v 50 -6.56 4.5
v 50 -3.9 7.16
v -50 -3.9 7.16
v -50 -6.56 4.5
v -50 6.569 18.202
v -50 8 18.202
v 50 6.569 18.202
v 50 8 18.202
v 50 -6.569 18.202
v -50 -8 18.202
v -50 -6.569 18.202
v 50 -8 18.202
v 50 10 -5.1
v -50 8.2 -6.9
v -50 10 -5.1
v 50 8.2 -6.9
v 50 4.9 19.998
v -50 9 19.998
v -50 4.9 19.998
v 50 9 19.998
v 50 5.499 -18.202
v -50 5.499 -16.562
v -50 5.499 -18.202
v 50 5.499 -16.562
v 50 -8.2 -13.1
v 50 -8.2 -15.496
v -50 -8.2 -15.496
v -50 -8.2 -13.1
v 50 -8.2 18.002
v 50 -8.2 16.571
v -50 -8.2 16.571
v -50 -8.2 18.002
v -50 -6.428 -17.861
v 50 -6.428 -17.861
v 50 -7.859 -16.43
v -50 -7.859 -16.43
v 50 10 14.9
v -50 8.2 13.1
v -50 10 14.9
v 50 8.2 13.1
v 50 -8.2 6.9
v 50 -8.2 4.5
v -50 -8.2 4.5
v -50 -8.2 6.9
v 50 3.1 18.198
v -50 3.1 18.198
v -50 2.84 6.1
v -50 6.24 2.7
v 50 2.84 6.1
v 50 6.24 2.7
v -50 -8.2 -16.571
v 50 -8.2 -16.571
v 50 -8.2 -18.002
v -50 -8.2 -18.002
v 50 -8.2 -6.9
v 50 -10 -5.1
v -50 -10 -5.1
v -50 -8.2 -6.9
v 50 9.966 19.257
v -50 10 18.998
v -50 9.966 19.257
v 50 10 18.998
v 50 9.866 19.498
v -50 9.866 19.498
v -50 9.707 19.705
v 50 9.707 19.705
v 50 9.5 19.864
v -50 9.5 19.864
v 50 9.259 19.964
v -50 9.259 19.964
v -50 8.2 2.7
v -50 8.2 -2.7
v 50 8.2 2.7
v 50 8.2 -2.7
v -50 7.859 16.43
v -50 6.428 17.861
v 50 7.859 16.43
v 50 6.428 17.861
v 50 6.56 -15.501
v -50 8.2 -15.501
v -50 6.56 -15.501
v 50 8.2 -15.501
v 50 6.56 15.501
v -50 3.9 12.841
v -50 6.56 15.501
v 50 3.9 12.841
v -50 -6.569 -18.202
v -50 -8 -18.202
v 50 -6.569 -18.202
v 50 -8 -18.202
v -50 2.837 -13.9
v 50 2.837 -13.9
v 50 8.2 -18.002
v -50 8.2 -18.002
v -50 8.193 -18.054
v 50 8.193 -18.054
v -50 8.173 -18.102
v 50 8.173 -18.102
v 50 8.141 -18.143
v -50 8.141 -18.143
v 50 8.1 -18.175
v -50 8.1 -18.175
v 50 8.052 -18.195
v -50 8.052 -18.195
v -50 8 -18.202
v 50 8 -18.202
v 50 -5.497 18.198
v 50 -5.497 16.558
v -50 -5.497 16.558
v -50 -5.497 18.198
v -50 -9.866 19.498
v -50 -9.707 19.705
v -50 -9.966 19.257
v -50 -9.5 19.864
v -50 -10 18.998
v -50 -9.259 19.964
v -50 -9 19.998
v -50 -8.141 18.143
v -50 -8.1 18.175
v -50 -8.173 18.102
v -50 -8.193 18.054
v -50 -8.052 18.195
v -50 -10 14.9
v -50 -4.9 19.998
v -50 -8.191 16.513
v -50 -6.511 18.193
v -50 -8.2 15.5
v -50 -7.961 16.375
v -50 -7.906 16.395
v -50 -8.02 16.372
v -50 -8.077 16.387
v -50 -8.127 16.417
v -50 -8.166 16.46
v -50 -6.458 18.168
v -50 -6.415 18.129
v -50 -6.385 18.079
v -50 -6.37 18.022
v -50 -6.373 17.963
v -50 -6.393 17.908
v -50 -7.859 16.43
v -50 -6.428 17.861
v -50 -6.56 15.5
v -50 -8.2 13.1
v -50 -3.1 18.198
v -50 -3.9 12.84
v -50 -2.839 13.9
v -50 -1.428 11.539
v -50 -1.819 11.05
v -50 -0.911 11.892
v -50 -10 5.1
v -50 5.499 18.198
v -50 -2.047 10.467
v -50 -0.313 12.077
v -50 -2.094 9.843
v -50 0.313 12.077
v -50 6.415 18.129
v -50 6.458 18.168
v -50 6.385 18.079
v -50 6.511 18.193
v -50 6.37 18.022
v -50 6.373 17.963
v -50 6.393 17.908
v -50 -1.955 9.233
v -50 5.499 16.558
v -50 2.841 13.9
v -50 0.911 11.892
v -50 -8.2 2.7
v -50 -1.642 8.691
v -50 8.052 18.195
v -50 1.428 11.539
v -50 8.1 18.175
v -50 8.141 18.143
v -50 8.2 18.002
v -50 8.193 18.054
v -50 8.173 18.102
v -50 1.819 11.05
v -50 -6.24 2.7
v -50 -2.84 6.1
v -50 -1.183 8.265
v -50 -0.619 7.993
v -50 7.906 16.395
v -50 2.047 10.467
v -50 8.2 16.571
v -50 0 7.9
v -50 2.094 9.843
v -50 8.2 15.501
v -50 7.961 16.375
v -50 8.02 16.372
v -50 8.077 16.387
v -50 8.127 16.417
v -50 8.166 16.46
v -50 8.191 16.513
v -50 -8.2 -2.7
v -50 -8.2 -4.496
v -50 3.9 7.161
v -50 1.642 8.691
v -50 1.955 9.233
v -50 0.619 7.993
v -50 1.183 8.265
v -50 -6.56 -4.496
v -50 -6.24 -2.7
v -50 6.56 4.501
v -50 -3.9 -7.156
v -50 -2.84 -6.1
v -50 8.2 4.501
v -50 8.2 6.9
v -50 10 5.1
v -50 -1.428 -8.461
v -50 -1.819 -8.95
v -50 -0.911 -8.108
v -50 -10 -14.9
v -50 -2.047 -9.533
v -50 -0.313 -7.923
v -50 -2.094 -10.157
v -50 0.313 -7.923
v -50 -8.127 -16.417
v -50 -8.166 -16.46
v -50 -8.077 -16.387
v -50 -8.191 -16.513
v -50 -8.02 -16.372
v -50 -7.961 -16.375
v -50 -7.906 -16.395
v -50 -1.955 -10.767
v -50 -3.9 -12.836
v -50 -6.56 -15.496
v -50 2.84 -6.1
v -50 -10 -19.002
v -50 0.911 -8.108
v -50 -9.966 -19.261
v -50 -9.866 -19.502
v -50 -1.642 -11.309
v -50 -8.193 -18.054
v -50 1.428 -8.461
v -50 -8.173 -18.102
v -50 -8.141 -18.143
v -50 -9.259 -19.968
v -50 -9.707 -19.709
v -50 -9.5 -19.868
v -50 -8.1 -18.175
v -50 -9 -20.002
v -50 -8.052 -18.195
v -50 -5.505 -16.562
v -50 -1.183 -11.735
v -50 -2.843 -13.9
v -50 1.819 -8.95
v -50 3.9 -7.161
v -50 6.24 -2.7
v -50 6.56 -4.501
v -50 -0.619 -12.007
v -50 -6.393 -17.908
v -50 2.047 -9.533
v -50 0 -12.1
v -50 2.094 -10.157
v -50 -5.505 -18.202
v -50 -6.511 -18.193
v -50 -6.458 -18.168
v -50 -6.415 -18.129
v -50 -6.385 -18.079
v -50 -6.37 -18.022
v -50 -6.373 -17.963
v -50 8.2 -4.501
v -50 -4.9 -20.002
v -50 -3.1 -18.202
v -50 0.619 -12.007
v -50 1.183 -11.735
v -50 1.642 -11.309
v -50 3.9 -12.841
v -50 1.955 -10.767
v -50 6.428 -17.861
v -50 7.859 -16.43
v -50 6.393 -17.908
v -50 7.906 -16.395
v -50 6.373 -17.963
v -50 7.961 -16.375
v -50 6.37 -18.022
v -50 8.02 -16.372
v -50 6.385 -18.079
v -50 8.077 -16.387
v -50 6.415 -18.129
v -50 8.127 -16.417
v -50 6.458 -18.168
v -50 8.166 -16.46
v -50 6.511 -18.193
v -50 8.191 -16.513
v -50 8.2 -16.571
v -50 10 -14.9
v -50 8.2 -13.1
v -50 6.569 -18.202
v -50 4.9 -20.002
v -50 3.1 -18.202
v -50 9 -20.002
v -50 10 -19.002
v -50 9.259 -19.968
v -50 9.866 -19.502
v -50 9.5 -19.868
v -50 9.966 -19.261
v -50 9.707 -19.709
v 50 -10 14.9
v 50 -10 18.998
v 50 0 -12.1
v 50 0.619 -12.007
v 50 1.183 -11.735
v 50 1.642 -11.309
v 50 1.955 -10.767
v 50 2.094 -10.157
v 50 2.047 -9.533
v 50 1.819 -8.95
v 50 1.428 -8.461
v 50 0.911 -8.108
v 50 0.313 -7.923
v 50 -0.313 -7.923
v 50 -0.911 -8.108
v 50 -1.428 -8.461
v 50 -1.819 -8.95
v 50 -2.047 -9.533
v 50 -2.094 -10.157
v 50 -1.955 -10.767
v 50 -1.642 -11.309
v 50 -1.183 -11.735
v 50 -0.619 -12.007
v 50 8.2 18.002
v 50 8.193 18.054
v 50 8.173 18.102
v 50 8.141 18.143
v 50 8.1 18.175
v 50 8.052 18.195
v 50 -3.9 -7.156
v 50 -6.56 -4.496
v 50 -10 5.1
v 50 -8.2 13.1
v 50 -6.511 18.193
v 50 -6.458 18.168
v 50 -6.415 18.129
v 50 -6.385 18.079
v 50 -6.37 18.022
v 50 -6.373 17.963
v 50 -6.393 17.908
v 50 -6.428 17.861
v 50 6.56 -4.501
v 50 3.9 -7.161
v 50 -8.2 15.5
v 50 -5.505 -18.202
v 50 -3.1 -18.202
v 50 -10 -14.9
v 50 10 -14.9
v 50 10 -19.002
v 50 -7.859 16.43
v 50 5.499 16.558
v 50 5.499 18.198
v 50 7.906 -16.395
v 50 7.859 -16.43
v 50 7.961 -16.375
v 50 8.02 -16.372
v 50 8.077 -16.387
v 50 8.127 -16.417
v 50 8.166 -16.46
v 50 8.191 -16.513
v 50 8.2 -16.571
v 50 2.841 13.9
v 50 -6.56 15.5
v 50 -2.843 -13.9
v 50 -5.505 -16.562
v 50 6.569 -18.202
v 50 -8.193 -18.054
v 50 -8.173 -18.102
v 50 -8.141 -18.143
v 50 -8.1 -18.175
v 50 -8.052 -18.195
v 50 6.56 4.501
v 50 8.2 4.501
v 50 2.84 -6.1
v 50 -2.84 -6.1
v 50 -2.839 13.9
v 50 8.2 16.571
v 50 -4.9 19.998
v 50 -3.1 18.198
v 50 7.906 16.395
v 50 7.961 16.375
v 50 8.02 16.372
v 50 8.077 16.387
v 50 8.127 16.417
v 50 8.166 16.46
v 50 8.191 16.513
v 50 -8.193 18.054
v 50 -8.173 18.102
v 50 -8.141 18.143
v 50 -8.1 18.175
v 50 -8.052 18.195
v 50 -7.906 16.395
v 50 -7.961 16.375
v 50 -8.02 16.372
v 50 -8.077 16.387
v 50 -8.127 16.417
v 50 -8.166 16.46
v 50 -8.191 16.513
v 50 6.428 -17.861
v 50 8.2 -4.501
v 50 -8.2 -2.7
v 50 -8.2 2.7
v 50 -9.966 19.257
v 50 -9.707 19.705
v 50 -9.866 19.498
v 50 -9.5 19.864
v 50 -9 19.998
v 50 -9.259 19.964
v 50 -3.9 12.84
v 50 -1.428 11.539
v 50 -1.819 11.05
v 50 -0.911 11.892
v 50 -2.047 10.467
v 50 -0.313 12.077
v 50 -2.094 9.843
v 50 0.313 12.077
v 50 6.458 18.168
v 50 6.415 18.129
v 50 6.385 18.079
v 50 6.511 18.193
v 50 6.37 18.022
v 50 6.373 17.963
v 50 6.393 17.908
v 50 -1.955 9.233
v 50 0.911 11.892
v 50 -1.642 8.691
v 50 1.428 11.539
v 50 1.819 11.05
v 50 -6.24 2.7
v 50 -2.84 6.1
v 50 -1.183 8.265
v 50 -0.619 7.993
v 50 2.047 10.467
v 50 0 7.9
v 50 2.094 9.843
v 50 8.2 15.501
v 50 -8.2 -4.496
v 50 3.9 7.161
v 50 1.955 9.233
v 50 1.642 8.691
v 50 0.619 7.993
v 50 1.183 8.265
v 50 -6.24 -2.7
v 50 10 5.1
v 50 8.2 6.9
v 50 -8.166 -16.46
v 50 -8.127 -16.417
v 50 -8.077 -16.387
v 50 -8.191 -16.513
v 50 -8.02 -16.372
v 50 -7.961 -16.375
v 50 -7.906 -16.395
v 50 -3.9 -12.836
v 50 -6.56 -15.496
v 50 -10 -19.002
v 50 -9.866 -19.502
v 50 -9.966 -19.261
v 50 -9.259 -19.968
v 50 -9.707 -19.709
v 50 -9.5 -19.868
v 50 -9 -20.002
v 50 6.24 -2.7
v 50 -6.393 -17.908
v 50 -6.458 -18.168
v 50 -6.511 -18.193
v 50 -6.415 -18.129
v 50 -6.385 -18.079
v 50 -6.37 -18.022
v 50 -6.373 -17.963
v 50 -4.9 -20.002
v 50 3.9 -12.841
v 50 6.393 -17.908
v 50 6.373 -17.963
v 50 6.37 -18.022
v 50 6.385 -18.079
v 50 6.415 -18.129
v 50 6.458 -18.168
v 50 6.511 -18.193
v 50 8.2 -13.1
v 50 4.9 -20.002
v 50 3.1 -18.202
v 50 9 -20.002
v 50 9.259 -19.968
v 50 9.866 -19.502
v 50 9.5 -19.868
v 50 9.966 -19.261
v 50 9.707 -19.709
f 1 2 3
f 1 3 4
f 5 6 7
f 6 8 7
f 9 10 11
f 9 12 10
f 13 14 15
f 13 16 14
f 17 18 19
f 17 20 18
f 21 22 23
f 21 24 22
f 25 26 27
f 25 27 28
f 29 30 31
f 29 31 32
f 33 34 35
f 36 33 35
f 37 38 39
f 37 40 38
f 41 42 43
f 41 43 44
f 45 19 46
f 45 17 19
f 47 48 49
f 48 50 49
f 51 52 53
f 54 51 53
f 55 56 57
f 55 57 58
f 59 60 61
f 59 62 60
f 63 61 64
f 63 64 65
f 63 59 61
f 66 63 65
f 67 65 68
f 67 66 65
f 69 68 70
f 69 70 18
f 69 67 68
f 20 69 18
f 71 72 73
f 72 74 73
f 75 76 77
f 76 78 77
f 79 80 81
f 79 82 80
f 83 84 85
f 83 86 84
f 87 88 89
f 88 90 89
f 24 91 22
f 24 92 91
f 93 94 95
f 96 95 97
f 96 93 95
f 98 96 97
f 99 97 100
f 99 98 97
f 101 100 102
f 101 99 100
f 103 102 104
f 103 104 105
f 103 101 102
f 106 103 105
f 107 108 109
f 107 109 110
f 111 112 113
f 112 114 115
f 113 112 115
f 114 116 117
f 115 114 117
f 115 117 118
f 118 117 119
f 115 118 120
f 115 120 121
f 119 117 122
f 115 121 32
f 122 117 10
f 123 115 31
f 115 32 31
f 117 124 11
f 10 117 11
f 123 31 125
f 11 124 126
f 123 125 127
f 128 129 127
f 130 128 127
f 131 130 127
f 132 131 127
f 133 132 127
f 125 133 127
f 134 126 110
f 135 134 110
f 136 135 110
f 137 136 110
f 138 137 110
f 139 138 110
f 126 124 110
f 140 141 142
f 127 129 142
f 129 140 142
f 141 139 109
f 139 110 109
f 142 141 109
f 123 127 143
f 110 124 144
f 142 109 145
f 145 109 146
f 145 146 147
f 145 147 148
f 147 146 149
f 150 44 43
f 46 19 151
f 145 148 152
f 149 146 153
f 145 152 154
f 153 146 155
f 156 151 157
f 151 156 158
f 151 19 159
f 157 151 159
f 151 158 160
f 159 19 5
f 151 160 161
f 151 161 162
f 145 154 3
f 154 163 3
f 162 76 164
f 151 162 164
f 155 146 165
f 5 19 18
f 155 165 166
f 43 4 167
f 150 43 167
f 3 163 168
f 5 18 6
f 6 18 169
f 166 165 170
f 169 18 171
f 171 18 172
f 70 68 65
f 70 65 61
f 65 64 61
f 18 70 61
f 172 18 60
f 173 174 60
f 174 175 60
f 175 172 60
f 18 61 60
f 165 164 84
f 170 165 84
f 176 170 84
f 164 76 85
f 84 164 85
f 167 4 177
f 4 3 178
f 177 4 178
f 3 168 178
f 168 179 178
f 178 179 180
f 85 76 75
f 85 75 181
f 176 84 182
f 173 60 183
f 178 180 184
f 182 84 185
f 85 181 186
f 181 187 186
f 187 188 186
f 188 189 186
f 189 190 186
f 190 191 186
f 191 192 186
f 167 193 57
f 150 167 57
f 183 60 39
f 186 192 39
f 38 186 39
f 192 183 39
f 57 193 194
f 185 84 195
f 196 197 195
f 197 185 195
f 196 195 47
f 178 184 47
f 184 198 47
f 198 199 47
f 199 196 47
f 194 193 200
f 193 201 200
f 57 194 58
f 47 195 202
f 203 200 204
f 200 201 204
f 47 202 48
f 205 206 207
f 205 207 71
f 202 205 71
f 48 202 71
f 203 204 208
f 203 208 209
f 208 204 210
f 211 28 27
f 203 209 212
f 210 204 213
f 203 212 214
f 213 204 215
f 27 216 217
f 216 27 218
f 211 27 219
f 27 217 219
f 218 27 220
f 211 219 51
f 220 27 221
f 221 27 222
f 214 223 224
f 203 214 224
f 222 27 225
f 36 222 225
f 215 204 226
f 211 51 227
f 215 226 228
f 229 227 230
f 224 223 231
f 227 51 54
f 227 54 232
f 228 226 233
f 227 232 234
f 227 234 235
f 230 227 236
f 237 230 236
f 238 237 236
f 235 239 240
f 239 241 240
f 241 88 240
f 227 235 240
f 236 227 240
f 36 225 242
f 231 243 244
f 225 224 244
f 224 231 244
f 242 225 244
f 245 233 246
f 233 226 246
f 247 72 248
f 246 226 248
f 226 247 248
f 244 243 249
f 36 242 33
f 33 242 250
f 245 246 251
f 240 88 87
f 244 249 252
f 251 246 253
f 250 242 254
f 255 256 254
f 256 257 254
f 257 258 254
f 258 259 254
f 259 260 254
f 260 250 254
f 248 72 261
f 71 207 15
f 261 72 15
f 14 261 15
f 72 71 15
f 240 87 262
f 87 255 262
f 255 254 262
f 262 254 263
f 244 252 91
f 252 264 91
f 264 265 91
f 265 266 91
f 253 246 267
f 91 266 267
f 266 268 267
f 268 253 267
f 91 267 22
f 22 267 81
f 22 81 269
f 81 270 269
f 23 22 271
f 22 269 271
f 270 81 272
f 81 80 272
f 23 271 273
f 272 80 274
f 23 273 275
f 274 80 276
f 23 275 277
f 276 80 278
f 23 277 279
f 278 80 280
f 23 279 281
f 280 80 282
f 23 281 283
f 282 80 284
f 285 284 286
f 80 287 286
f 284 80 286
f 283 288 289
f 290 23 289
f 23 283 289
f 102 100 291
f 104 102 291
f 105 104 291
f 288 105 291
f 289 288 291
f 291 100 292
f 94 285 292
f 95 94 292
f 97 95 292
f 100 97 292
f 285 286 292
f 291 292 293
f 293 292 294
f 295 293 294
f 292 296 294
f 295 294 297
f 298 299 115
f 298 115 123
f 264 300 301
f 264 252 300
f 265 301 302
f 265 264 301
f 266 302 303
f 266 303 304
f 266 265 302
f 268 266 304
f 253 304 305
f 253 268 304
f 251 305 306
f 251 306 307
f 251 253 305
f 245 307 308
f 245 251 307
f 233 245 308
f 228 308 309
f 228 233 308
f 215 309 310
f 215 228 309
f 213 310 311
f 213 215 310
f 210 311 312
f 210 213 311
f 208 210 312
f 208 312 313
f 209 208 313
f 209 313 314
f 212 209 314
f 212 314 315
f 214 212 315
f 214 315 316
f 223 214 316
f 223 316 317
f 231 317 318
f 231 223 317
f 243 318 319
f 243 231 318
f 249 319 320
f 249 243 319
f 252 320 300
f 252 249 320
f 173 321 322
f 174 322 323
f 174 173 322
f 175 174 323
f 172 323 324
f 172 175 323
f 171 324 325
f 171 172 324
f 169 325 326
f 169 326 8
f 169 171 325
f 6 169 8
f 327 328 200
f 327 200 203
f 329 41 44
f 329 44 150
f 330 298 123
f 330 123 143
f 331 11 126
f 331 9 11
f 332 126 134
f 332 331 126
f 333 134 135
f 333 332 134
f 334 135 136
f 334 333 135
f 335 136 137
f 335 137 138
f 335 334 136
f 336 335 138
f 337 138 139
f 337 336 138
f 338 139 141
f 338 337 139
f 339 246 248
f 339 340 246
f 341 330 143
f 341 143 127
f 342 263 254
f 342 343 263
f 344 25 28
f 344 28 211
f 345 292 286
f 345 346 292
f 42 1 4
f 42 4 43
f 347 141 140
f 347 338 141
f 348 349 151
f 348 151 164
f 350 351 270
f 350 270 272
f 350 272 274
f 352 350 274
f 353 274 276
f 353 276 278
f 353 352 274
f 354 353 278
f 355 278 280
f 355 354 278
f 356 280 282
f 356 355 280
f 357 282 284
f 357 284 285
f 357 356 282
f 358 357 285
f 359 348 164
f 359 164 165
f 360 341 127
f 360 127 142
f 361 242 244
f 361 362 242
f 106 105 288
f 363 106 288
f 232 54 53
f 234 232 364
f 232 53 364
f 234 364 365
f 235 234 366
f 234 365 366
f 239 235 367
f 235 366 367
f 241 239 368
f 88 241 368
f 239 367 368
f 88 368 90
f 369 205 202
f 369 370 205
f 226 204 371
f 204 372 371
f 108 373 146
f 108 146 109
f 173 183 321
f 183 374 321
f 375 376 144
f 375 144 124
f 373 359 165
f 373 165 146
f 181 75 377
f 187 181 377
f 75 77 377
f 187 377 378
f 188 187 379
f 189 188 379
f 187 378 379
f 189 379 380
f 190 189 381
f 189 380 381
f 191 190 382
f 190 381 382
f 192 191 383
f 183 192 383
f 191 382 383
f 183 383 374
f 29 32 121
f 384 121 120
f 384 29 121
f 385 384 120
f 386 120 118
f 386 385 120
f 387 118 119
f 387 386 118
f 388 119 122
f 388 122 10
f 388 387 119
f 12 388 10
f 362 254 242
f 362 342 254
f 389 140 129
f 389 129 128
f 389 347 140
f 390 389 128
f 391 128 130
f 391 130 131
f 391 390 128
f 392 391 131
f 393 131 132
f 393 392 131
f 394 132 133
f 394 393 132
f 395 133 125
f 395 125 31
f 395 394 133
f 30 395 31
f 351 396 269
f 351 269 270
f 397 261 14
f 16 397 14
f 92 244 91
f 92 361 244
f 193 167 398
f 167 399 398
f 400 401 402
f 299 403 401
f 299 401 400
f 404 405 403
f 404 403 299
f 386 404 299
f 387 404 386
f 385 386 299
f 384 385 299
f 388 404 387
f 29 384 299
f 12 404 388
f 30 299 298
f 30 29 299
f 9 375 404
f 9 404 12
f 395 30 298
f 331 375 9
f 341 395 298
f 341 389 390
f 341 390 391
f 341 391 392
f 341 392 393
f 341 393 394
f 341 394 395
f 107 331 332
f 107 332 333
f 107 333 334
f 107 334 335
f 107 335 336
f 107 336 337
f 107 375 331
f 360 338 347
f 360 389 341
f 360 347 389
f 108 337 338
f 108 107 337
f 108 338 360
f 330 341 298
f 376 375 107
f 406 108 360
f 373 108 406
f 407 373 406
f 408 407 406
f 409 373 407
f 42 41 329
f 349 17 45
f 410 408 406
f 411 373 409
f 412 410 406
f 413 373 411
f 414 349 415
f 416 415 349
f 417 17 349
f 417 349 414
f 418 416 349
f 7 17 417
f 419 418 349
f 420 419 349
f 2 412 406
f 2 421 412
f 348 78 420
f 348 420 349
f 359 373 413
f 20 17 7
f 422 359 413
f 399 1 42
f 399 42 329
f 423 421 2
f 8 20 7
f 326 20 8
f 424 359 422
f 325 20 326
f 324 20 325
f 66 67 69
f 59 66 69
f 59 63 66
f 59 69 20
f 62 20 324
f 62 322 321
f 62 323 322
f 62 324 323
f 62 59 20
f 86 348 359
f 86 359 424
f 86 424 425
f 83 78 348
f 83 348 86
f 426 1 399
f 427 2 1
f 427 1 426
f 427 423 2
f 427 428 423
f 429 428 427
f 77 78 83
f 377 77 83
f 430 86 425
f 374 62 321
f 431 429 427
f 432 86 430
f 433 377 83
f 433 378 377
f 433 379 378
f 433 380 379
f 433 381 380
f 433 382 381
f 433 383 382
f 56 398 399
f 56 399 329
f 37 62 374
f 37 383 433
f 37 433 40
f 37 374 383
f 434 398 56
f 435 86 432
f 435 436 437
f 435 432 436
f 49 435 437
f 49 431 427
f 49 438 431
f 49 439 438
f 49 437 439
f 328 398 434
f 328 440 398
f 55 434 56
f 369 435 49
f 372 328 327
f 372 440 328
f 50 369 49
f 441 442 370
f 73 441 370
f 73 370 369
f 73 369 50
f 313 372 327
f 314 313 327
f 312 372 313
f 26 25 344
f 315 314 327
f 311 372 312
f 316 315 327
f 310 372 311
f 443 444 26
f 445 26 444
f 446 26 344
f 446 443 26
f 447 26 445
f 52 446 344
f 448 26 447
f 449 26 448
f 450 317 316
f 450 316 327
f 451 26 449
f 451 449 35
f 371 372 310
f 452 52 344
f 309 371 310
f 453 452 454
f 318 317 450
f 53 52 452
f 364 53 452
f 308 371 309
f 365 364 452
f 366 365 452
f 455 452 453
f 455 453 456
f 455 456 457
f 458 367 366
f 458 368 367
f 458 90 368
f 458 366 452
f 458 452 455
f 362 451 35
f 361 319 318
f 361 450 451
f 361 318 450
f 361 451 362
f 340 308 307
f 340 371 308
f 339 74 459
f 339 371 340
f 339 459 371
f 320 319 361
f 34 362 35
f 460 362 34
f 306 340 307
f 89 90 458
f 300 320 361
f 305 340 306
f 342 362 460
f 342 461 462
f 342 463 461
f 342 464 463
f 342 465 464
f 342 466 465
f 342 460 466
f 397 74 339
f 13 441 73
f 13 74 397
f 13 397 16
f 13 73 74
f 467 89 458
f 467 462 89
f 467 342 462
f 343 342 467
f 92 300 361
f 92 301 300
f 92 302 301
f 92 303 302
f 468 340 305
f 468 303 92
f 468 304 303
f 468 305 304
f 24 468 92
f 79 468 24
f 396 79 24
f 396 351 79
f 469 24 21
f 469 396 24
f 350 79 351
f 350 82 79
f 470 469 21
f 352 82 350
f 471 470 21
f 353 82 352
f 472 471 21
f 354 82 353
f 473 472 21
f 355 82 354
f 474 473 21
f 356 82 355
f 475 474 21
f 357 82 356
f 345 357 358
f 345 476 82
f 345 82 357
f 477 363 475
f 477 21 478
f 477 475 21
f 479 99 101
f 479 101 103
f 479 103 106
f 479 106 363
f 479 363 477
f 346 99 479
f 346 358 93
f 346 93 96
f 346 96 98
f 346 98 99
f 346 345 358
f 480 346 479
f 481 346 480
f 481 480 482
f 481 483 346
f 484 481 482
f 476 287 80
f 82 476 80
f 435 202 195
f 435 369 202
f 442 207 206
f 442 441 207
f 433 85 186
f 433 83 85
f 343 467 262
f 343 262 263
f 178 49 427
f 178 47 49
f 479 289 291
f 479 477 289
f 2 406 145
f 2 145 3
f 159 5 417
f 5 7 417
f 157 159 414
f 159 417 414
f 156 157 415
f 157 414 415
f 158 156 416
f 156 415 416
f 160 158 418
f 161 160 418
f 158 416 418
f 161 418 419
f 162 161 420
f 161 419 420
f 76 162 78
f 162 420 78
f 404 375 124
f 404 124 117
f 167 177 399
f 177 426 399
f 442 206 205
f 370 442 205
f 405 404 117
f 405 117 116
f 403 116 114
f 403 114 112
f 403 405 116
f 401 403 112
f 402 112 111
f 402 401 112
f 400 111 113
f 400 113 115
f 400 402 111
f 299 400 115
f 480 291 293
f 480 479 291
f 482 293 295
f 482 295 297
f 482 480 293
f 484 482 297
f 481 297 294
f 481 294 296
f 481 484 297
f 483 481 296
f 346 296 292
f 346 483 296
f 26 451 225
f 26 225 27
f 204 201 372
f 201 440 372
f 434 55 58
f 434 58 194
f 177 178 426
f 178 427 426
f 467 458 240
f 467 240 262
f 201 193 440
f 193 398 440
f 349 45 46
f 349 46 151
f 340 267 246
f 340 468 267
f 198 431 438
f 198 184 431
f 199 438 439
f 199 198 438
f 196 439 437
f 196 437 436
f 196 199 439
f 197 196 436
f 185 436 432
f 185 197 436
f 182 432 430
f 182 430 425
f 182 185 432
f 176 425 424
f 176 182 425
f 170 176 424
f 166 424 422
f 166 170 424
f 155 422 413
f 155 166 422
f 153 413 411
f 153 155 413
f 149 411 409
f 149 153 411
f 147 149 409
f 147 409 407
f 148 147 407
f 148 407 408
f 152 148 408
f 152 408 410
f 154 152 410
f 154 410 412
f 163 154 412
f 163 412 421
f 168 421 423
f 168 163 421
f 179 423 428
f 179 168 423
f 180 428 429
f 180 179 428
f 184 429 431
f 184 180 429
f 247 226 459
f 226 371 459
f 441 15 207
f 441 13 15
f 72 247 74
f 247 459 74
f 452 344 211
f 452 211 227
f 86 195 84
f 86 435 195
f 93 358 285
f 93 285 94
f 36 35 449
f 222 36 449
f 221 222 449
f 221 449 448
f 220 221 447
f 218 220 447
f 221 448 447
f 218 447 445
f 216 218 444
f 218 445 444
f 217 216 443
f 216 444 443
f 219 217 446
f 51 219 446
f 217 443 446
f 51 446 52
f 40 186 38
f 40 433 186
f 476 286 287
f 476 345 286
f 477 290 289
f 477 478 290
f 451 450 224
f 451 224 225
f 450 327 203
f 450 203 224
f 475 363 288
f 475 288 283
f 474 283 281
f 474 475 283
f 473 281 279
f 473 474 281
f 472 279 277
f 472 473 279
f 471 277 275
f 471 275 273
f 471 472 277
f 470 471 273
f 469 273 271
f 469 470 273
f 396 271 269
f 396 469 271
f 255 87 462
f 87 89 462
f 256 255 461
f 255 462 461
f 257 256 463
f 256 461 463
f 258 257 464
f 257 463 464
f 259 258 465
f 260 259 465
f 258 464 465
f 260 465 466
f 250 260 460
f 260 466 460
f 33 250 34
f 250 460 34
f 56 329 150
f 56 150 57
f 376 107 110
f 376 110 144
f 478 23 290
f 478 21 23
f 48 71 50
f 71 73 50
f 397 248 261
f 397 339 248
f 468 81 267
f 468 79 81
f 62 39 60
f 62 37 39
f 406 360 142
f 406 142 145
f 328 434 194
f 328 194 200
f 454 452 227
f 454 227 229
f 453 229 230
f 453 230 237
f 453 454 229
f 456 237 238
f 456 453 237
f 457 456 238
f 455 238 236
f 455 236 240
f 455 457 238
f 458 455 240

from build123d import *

# Parameters (mm, degrees)
SKETCH5_R           = 2.1
BOSS_EXTRUDE1_DEPTH = 50


with BuildPart() as part:
    # Sketch5 → Boss-Extrude1 (new, symmetric)
    with BuildSketch(Plane(origin=(0, 0, 0), x_dir=(0, 0, -1), z_dir=(1, 0, 0))):
        with BuildLine():
            Line((-19.998019485, 4.9), (-18.198019485, 3.1))
            Line((-18.198019485, 3.1), (-18.198019485, 5.499339828))
            Line((-18.198019485, 5.499339828), (-16.558019485, 5.499339828))
            Line((-16.558019485, 5.499339828), (-13.9, 2.841320344))
            Line((-13.9, 2.841320344), (-13.9, -2.838679656))
            Line((-13.9, -2.838679656), (-16.558019485, -5.496699141))
            Line((-16.558019485, -5.496699141), (-18.198019485, -5.496699141))
            Line((-18.198019485, -5.496699141), (-18.198019485, -3.1))
            Line((-18.198019485, -3.1), (-19.998019485, -4.9))
            Line((-19.998019485, -4.9), (-19.998019485, -9))
            ThreePointArc((-19.998019485, -9), (-19.705126266, -9.707106781), (-18.998019485, -10))
            Line((-18.998019485, -10), (-14.9, -10))
            Line((-14.9, -10), (-13.1, -8.2))
            Line((-13.1, -8.2), (-15.5, -8.2))
            Line((-15.5, -8.2), (-15.5, -6.56))
            Line((-15.5, -6.56), (-12.84, -3.9))
            Line((-12.84, -3.9), (-7.16, -3.9))
            Line((-7.16, -3.9), (-4.5, -6.56))
            Line((-4.5, -6.56), (-4.5, -8.2))
            Line((-4.5, -8.2), (-6.9, -8.2))
            Line((-6.9, -8.2), (-5.1, -10))
            Line((-5.1, -10), (5.1, -10))
            Line((5.1, -10), (6.9, -8.2))
            Line((6.9, -8.2), (4.496038969, -8.2))
            Line((4.496038969, -8.2), (4.496038969, -6.56))
            Line((4.496038969, -6.56), (7.156038969, -3.9))
            Line((7.156038969, -3.9), (12.836038969, -3.9))
            Line((12.836038969, -3.9), (15.496038969, -6.56))
            Line((15.496038969, -6.56), (15.496038969, -8.2))
            Line((15.496038969, -8.2), (13.1, -8.2))
            Line((13.1, -8.2), (14.9, -10))
            Line((14.9, -10), (19.001980515, -10))
            ThreePointArc((19.001980515, -10), (19.709087297, -9.707106781), (20.001980515, -9))
            Line((20.001980515, -9), (20.001980515, -4.9))
            Line((20.001980515, -4.9), (18.201980515, -3.1))
            Line((18.201980515, -3.1), (18.201980515, -5.504621202))
            Line((18.201980515, -5.504621202), (16.561980515, -5.504621202))
            Line((16.561980515, -5.504621202), (13.9, -2.842640687))
            Line((13.9, -2.842640687), (13.9, 2.837359313))
            Line((13.9, 2.837359313), (16.561980515, 5.499339828))
            Line((16.561980515, 5.499339828), (18.201980515, 5.499339828))
            Line((18.201980515, 5.499339828), (18.201980515, 3.1))
            Line((18.201980515, 3.1), (20.001980515, 4.9))
            Line((20.001980515, 4.9), (20.001980515, 9))
            ThreePointArc((20.001980515, 9), (19.709087297, 9.707106781), (19.001980515, 10))
            Line((19.001980515, 10), (14.9, 10))
            Line((14.9, 10), (13.1, 8.2))
            Line((13.1, 8.2), (15.501320344, 8.2))
            Line((15.501320344, 8.2), (15.501320344, 6.56))
            Line((15.501320344, 6.56), (12.841320344, 3.9))
            Line((12.841320344, 3.9), (7.161320344, 3.9))
            Line((7.161320344, 3.9), (4.501320344, 6.56))
            Line((4.501320344, 6.56), (4.501320344, 8.2))
            Line((4.501320344, 8.2), (6.9, 8.2))
            Line((6.9, 8.2), (5.1, 10))
            Line((5.1, 10), (-5.1, 10))
            Line((-5.1, 10), (-6.9, 8.2))
            Line((-6.9, 8.2), (-4.501320344, 8.2))
            Line((-4.501320344, 8.2), (-4.501320344, 6.56))
            Line((-4.501320344, 6.56), (-7.161320344, 3.9))
            Line((-7.161320344, 3.9), (-12.841320344, 3.9))
            Line((-12.841320344, 3.9), (-15.501320344, 6.56))
            Line((-15.501320344, 6.56), (-15.501320344, 8.2))
            Line((-15.501320344, 8.2), (-13.1, 8.2))
            Line((-13.1, 8.2), (-14.9, 10))
            Line((-14.9, 10), (-18.998019485, 10))
            ThreePointArc((-18.998019485, 10), (-19.705126266, 9.707106781), (-19.998019485, 9))
            Line((-19.998019485, 9), (-19.998019485, 4.9))
        make_face()
        with Locations((-10, 0)):
            Circle(SKETCH5_R, mode=Mode.SUBTRACT)
        with Locations((10, 0)):
            Circle(SKETCH5_R, mode=Mode.SUBTRACT)
        Polygon((6.1, -2.84), (6.1, 2.84), (2.7, 6.24), (2.7, 8.2), (-2.7, 8.2), (-2.7, 6.24), (-6.1, 2.84), (-6.1, -2.84), (-2.7, -6.24), (-2.7, -8.2), (2.7, -8.2), (2.7, -6.24), align=None, mode=Mode.SUBTRACT)
        with BuildLine():
            Line((16.571320344, 8.2), (18.001980515, 8.2))
            ThreePointArc((18.001980515, 8.2), (18.143401872, 8.141421356), (18.201980515, 8))
            Line((18.201980515, 8), (18.201980515, 6.569339828))
            ThreePointArc((18.201980515, 6.569339828), (18.078517202, 6.384563922), (17.860559159, 6.427918472))
            Line((17.860559159, 6.427918472), (16.429898987, 7.858578644))
            ThreePointArc((16.429898987, 7.858578644), (16.386544437, 8.076536686), (16.571320344, 8.2))
        make_face(mode=Mode.SUBTRACT)
        with BuildLine():
            Line((16.571320344, -8.2), (18.001980515, -8.2))
            ThreePointArc((18.001980515, -8.2), (18.143401872, -8.141421356), (18.201980515, -8))
            Line((18.201980515, -8), (18.201980515, -6.569339828))
            ThreePointArc((18.201980515, -6.569339828), (18.078517202, -6.384563922), (17.860559159, -6.427918472))
            Line((17.860559159, -6.427918472), (16.429898987, -7.858578644))
            ThreePointArc((16.429898987, -7.858578644), (16.386544437, -8.076536686), (16.571320344, -8.2))
        make_face(mode=Mode.SUBTRACT)
        with BuildLine():
            Line((-17.860559159, 6.427918472), (-16.429898987, 7.858578644))
            ThreePointArc((-16.429898987, 7.858578644), (-16.386544437, 8.076536686), (-16.571320344, 8.2))
            Line((-16.571320344, 8.2), (-18.001980515, 8.2))
            ThreePointArc((-18.001980515, 8.2), (-18.143401872, 8.141421356), (-18.201980515, 8))
            Line((-18.201980515, 8), (-18.201980515, 6.569339828))
            ThreePointArc((-18.201980515, 6.569339828), (-18.078517202, 6.384563922), (-17.860559159, 6.427918472))
        make_face(mode=Mode.SUBTRACT)
        with BuildLine():
            Line((-16.571320344, -8.2), (-18.001980515, -8.2))
            ThreePointArc((-18.001980515, -8.2), (-18.143401872, -8.141421356), (-18.201980515, -8))
            Line((-18.201980515, -8), (-18.201980515, -6.569339828))
            ThreePointArc((-18.201980515, -6.569339828), (-18.078517202, -6.384563922), (-17.860559159, -6.427918472))
            Line((-17.860559159, -6.427918472), (-16.429898987, -7.858578644))
            ThreePointArc((-16.429898987, -7.858578644), (-16.386544437, -8.076536686), (-16.571320344, -8.2))
        make_face(mode=Mode.SUBTRACT)
    extrude(amount=BOSS_EXTRUDE1_DEPTH, both=True)


solid = part.part
